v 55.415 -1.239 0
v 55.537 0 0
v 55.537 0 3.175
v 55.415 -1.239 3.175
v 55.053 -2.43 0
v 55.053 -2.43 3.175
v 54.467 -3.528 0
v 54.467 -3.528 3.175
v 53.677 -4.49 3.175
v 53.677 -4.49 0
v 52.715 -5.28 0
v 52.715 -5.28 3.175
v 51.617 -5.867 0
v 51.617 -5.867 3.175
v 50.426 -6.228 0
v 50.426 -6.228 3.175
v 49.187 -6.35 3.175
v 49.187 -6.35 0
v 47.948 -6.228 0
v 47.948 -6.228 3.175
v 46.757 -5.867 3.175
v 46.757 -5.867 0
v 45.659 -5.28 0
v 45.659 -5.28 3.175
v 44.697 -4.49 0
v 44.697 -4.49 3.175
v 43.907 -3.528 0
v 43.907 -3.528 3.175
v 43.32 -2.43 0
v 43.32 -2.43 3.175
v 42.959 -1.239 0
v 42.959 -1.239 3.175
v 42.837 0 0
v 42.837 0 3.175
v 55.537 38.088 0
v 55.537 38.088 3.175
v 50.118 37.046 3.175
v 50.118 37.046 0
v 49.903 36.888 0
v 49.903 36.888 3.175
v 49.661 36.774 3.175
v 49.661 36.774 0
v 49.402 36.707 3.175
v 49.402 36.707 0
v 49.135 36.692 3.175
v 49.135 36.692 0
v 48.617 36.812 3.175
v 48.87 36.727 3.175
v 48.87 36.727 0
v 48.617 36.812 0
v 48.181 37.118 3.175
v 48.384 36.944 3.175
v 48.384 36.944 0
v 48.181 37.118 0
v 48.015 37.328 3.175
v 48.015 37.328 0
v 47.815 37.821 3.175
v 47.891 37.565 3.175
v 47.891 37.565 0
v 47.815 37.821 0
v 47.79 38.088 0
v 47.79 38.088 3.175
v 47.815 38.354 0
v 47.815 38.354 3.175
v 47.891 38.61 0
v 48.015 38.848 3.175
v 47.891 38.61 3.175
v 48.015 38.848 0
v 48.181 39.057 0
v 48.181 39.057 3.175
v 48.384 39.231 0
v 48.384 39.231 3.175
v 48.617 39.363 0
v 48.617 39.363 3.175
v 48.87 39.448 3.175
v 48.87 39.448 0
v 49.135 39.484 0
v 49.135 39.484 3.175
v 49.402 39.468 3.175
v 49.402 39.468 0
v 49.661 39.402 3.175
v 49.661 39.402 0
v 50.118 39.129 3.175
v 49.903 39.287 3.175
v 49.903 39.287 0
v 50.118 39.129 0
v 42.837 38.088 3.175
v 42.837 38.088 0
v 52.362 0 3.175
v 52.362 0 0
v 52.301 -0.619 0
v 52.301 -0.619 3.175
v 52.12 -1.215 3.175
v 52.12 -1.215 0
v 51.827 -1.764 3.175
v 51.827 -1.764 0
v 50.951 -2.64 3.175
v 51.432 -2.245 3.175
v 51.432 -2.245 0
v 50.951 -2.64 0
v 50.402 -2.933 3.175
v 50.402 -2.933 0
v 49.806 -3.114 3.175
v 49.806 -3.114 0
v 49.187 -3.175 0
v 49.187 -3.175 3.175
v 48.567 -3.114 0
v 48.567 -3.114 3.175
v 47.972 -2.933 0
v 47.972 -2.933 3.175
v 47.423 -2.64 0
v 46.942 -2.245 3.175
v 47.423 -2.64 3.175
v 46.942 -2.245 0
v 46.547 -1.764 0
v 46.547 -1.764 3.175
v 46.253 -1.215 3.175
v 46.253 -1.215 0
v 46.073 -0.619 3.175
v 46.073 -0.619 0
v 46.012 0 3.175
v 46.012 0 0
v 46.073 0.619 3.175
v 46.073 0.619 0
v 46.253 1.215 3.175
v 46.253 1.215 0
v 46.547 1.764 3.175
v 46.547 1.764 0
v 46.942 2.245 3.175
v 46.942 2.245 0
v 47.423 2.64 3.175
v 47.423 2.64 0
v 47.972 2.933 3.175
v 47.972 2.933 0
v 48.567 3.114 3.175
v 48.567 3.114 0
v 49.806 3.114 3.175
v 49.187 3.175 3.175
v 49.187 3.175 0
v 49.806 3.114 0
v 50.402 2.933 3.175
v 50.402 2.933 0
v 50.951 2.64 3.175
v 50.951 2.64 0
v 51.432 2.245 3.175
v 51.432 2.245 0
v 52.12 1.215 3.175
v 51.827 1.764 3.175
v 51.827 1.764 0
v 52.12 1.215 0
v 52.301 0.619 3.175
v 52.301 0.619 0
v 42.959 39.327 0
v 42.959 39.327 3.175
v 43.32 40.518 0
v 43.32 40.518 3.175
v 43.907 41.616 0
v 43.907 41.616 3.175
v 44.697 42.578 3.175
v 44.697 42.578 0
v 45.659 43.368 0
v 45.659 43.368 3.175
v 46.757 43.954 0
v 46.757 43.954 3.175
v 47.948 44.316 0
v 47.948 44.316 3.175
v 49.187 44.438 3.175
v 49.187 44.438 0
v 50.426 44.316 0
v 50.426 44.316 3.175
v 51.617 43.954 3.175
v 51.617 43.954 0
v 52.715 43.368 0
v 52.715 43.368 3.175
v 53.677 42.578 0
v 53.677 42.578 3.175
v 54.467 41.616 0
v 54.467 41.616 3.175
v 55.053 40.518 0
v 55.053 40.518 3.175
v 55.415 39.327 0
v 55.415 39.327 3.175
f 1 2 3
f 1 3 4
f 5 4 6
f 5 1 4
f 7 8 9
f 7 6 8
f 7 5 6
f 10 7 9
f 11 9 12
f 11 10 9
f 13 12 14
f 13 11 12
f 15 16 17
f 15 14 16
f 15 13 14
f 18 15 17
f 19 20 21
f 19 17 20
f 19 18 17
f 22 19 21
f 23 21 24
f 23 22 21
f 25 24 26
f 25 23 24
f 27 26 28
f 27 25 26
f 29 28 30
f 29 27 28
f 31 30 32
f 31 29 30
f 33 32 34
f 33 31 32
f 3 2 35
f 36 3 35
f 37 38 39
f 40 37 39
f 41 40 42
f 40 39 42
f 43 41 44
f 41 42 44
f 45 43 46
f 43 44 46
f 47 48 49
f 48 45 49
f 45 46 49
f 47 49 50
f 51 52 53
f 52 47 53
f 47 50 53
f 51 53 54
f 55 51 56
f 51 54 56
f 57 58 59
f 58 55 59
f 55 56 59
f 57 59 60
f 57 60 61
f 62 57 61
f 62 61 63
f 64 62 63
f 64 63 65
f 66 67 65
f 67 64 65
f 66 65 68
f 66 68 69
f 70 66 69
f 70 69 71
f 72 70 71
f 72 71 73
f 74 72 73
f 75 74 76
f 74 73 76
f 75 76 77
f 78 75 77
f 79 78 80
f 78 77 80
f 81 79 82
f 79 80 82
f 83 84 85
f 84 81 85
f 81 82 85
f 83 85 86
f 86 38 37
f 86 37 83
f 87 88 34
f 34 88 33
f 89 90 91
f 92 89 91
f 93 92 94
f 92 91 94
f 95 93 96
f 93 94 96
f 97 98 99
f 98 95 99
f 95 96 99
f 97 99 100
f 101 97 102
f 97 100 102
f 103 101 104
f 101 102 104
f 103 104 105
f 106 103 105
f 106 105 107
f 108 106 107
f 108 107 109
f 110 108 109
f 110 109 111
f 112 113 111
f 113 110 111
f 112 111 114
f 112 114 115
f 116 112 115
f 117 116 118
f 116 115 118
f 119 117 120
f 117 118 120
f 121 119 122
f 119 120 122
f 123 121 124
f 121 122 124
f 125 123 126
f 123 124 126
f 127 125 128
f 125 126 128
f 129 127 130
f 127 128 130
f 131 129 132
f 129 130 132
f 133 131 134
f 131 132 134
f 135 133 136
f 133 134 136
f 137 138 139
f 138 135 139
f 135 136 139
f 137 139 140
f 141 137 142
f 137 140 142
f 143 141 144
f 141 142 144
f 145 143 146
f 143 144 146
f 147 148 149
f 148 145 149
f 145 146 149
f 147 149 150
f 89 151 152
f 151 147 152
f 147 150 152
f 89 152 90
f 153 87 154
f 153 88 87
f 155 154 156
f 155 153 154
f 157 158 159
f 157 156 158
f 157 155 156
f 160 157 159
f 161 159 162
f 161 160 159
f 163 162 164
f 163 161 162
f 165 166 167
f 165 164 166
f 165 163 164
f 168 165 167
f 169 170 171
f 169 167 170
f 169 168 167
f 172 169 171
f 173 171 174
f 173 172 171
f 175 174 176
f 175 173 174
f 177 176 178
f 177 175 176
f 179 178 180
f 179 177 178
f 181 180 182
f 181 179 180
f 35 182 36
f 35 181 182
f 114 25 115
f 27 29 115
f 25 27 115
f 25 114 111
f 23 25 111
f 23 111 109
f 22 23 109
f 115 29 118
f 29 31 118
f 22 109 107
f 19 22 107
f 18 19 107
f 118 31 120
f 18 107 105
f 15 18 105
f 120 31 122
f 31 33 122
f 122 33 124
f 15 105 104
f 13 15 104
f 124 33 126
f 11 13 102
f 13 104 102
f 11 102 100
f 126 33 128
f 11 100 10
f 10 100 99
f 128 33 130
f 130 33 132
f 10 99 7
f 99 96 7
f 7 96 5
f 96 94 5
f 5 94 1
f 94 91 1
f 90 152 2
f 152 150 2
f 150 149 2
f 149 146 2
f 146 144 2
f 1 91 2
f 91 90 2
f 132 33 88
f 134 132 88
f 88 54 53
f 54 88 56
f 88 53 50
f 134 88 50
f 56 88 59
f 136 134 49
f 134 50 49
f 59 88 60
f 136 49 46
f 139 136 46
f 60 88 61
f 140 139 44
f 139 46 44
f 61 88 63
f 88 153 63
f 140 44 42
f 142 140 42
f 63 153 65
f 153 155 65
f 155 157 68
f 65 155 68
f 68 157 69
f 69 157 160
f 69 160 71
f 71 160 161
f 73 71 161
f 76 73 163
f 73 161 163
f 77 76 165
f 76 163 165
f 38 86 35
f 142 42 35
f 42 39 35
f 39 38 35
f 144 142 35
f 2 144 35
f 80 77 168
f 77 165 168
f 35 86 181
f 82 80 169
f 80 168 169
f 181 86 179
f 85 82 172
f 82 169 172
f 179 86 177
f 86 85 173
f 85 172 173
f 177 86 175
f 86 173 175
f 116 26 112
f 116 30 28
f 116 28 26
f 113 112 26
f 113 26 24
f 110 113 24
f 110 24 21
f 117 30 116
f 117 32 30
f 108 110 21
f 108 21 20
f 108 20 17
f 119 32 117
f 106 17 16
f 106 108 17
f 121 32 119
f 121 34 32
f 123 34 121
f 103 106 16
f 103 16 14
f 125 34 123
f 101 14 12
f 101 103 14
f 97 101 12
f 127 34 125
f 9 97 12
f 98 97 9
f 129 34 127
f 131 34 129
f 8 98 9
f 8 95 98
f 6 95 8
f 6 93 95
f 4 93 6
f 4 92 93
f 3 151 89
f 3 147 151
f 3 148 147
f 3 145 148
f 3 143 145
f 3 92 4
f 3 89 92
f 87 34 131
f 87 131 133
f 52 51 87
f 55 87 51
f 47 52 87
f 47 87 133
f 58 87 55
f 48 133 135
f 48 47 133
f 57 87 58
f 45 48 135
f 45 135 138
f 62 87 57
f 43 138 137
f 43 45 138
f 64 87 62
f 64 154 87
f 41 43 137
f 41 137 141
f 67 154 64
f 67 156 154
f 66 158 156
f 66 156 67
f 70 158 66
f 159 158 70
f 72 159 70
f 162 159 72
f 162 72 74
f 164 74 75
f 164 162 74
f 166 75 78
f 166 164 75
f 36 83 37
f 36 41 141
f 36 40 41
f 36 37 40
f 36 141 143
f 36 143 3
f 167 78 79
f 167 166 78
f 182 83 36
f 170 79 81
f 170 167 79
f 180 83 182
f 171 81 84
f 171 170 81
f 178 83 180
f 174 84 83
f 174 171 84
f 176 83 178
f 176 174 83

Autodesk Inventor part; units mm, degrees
ref_plane "YZ Plane" through (0, 0, 0) normal (1, 0, 0) x (0, 1, 0)
ref_plane "XZ Plane" through (0, 0, 0) normal (0, 1, 0) x (-1, 0, 0)
ref_plane "XY Plane" through (0, 0, 0) normal (0, 0, 1) x (1, 0, 0)
sketch "Sketch1" plane through (0, 0, 0) normal (0, 0, 1) x (1, 0, 0)
  circle A0 centre (49.1868, 0) radius 3.175
  arc A1 (50.1181, 39.1289) -> (50.1181, 37.0464) centre (49.1868, 38.0877) ccw
  line L0 (49.1868, 38.0877) -> (49.1868, 0) construction
  line L1 (42.8368, 38.0877) -> (42.8368, 0)
  line L2 (55.5368, 0) -> (55.5368, 38.0877)
  arc A2 (55.5368, 38.0877) -> (42.8368, 38.0877) centre (49.1868, 38.0877) ccw
  arc A3 (42.8368, 0) -> (55.5368, 0) centre (49.1868, 0) ccw
  line L3 (47.7898, 38.0877) -> (50.3298, 38.0877) construction
  line L4 (50.1181, 37.0464) -> (50.1181, 39.1289)
  point P0 (49.1868, 19.0438)
  dimension "d0" = 12.7
  dimension "d3" = 2.794
  dimension "d4" = 2.54
extrude "Extrusion1" add sketch "Sketch1" along normal blind 3.175
